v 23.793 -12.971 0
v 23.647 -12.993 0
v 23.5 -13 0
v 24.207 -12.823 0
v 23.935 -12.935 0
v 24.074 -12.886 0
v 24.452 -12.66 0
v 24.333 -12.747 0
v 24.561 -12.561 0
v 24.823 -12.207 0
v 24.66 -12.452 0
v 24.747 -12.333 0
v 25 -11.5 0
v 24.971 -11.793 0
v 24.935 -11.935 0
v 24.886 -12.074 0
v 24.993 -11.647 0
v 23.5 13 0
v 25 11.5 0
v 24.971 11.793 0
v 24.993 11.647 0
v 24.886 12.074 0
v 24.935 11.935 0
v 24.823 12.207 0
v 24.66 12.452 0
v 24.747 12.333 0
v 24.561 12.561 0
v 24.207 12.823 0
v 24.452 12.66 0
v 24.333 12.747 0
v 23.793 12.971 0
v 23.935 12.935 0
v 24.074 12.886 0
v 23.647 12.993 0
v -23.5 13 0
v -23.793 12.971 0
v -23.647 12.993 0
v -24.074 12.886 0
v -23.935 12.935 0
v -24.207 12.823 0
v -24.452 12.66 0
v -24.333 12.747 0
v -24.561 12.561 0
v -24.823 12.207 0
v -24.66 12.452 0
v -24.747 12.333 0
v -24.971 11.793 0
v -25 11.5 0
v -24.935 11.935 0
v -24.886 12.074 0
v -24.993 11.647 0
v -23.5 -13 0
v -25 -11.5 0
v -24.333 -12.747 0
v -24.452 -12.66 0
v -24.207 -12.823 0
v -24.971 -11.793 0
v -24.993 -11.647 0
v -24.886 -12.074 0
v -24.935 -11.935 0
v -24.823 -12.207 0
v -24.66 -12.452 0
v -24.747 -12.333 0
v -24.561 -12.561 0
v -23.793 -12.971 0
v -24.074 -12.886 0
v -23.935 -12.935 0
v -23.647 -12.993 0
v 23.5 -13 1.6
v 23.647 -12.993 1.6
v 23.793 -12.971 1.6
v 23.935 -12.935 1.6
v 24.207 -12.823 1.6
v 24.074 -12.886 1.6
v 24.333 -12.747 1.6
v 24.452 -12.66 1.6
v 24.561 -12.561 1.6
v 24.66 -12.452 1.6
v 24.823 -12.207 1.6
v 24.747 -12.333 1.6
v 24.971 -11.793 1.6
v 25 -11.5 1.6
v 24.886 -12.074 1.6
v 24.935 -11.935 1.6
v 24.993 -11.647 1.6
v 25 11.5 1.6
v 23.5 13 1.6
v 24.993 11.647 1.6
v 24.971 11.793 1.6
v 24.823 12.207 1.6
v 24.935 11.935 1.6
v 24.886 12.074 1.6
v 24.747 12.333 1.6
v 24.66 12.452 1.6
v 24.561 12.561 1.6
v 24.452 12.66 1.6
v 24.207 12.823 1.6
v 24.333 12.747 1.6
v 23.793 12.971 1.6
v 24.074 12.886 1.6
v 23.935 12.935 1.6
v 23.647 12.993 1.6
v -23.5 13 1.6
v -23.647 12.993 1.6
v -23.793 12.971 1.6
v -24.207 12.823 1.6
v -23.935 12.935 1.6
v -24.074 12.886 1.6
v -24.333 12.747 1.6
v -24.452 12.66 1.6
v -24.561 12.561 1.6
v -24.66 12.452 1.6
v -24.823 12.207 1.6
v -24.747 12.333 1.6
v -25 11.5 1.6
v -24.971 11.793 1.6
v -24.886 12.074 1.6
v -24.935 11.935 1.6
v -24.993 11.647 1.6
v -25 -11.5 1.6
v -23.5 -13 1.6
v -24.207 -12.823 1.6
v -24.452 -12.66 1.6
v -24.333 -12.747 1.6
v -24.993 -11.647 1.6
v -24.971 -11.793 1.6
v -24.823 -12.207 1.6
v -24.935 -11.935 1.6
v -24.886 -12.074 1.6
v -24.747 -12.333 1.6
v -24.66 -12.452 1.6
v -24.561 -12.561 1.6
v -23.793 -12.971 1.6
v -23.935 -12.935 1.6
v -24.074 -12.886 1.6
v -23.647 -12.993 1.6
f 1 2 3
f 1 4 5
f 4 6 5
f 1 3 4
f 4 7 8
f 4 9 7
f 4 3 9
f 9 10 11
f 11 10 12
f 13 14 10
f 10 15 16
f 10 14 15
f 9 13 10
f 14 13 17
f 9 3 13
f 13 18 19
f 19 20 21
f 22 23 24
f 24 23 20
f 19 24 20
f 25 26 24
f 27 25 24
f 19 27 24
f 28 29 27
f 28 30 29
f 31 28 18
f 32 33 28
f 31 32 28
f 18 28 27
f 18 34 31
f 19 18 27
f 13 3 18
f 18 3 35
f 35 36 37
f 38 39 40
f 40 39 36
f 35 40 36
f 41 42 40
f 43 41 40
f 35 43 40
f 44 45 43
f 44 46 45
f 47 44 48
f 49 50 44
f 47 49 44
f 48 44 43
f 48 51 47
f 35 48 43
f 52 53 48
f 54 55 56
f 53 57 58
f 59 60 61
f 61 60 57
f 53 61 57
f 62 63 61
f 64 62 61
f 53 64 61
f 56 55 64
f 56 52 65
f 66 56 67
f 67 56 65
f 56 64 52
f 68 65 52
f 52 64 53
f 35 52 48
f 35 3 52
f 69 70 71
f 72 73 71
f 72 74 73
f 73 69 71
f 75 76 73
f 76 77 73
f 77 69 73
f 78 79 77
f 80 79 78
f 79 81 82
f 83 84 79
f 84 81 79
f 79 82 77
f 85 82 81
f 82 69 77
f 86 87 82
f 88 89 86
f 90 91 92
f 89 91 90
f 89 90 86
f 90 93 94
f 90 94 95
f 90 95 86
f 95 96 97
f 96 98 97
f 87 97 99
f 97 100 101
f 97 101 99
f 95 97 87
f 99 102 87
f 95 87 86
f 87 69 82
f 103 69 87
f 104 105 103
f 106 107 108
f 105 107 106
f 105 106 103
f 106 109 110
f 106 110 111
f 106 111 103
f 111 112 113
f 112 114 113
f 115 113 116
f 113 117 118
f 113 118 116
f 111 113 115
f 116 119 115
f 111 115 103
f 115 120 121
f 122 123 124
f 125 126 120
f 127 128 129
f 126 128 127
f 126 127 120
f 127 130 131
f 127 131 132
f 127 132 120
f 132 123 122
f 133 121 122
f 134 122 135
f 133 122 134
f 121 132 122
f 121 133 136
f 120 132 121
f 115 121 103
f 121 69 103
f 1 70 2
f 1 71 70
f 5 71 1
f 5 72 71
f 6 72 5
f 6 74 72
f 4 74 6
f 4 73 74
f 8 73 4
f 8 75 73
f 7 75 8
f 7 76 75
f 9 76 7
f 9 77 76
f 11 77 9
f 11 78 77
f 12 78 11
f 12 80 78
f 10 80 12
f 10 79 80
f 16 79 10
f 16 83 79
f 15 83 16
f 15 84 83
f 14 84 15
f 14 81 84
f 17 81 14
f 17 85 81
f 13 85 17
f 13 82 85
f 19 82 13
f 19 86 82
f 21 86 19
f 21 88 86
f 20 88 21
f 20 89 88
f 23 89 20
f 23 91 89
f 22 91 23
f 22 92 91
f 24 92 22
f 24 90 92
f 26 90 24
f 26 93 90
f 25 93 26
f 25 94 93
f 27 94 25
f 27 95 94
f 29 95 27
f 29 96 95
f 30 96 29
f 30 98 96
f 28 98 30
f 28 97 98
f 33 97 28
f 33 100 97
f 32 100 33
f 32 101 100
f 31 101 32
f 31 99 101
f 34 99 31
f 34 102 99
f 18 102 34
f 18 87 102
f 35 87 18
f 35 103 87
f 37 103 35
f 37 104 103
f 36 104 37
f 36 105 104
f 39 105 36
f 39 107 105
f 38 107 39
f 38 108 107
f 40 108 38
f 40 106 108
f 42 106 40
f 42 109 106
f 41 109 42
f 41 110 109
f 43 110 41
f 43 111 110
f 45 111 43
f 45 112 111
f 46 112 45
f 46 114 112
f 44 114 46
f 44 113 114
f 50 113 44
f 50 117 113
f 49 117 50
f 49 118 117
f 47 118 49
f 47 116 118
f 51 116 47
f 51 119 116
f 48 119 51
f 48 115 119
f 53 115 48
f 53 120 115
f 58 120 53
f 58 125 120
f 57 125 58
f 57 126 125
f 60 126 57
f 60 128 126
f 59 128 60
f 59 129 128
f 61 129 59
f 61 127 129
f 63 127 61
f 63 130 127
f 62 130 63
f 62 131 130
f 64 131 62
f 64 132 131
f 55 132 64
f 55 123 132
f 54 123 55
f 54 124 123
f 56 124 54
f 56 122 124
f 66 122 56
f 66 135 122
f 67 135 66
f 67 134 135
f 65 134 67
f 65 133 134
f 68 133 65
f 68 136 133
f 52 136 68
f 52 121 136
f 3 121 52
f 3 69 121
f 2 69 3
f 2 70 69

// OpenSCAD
$fn = 64;

length = 50.0;
width  = 26.0;
thick  = 1.6;

module relay_module_pcb(l=length, w=width, t=thick, corner_r=1.5) {
    color([0.05, 0.35, 0.12])
    linear_extrude(height=t)
        offset(r=corner_r)
            square([l - 2*corner_r, w - 2*corner_r], center=true);
}

relay_module_pcb();
